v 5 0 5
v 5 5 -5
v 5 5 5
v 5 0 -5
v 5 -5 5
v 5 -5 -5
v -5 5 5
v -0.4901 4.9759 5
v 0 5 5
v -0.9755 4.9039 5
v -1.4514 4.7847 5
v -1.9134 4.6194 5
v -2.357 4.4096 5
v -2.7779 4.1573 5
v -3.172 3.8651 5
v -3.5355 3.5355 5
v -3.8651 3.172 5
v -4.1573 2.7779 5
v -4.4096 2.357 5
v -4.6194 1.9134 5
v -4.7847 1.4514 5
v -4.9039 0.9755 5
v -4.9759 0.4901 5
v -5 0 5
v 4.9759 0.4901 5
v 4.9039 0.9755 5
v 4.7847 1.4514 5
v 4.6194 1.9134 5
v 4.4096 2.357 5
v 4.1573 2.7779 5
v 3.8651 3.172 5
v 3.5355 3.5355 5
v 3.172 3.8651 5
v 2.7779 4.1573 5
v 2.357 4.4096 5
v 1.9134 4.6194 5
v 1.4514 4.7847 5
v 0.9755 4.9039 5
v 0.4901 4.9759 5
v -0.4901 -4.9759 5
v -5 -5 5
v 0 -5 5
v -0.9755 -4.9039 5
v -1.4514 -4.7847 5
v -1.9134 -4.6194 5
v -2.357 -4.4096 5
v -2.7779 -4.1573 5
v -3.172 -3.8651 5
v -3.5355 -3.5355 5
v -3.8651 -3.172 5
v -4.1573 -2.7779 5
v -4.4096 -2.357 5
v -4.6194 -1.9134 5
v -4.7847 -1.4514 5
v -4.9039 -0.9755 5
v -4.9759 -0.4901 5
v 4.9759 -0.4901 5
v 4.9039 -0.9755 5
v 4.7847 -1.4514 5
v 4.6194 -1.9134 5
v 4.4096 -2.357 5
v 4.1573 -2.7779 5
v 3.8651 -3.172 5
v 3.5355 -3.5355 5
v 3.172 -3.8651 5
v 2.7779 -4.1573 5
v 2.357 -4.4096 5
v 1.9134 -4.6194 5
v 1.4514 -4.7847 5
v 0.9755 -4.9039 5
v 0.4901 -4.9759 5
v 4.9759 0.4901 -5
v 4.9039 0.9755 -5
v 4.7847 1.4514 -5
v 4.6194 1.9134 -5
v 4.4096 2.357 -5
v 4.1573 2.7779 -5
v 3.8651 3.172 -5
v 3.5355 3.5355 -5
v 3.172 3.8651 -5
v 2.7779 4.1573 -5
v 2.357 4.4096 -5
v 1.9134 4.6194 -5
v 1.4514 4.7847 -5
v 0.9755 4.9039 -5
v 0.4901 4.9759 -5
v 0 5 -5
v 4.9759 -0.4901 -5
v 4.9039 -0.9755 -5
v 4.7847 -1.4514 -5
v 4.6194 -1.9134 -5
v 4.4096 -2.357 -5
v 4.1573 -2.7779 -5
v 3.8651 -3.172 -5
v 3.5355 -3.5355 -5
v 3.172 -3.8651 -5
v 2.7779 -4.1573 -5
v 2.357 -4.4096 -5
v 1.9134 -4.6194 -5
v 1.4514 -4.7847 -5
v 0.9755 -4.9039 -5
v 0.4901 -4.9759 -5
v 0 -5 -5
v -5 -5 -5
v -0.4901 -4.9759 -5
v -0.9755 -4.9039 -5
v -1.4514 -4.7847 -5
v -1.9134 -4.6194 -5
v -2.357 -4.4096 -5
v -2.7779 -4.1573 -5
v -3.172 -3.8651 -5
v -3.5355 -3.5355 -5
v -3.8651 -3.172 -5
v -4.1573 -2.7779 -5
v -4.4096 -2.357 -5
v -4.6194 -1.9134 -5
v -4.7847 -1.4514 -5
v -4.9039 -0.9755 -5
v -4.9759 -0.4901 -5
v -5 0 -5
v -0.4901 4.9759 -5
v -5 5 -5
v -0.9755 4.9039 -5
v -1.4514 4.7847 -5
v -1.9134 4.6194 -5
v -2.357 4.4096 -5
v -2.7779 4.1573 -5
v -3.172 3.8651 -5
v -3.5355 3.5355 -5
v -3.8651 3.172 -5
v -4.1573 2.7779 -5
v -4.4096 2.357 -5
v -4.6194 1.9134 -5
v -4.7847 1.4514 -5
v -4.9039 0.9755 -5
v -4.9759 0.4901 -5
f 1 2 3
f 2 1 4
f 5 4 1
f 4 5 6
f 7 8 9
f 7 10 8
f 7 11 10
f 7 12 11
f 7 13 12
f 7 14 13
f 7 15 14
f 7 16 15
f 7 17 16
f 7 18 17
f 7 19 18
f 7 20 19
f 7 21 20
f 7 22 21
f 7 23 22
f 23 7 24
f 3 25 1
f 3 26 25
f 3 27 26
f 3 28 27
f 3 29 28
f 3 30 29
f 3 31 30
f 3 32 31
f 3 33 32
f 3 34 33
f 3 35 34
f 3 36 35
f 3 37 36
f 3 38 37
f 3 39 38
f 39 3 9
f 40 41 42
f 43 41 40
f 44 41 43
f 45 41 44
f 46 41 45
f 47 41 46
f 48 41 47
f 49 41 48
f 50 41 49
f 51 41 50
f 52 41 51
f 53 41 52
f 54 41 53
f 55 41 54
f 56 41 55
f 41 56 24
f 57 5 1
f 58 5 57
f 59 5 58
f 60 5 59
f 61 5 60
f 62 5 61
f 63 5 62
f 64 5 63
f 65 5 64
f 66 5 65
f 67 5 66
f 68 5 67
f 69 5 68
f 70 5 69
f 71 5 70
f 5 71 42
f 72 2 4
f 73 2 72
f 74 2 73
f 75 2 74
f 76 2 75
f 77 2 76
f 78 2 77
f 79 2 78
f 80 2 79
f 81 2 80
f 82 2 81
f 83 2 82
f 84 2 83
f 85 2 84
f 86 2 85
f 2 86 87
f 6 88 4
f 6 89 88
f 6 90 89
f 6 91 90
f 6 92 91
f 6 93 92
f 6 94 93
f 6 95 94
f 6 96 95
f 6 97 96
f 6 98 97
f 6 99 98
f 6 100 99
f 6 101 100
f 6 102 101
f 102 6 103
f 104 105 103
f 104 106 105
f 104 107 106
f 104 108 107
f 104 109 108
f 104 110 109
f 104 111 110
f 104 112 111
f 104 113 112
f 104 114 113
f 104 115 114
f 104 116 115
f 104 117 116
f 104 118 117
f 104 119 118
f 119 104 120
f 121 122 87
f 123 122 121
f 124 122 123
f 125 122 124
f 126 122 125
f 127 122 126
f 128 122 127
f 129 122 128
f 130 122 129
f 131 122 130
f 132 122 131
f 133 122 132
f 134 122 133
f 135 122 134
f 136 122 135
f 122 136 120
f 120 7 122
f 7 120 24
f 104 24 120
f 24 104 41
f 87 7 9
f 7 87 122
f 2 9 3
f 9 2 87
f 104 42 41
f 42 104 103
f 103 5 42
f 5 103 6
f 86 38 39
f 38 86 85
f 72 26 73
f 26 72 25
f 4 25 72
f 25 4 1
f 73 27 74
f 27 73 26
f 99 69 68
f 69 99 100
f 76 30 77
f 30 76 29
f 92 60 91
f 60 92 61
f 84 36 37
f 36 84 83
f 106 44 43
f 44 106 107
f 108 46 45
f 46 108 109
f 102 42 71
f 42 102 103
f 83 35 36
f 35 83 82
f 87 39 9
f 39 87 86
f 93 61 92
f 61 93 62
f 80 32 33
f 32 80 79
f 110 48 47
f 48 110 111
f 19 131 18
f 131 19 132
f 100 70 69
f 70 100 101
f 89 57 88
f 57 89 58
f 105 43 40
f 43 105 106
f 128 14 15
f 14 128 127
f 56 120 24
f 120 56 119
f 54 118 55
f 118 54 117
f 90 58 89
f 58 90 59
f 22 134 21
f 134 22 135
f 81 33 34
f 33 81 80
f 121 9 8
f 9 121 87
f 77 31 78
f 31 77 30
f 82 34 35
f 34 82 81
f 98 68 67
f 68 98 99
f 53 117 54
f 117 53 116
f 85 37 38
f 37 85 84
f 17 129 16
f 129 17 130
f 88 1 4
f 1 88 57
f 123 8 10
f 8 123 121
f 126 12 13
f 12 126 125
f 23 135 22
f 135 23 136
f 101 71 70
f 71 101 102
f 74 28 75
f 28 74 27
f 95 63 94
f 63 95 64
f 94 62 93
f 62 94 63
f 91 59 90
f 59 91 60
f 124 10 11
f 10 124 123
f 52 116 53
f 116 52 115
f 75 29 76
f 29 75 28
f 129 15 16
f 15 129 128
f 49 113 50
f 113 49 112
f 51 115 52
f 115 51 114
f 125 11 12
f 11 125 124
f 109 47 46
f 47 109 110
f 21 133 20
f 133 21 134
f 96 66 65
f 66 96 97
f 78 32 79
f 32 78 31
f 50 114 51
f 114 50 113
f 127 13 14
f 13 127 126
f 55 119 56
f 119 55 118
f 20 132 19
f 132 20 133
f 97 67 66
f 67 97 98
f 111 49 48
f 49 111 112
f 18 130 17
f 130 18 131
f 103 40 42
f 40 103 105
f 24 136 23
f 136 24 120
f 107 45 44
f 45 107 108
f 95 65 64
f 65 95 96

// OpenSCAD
// Set fragment number for roundings
$fn = $preview ? 32 : 64;

// Size of the cube (all directions)
cubSiz = 10;

//Diameter of the Cylinder
cyDia = 10;

//Height of the Cylinder
cyHei = 15;

// Let's subtract the Cylinder from the Cube
difference(){
    cube(size = [cubSiz, cubSiz, cubSiz], center = true);
    cylinder(d = cyDia, h = cyHei, center = true);
}
